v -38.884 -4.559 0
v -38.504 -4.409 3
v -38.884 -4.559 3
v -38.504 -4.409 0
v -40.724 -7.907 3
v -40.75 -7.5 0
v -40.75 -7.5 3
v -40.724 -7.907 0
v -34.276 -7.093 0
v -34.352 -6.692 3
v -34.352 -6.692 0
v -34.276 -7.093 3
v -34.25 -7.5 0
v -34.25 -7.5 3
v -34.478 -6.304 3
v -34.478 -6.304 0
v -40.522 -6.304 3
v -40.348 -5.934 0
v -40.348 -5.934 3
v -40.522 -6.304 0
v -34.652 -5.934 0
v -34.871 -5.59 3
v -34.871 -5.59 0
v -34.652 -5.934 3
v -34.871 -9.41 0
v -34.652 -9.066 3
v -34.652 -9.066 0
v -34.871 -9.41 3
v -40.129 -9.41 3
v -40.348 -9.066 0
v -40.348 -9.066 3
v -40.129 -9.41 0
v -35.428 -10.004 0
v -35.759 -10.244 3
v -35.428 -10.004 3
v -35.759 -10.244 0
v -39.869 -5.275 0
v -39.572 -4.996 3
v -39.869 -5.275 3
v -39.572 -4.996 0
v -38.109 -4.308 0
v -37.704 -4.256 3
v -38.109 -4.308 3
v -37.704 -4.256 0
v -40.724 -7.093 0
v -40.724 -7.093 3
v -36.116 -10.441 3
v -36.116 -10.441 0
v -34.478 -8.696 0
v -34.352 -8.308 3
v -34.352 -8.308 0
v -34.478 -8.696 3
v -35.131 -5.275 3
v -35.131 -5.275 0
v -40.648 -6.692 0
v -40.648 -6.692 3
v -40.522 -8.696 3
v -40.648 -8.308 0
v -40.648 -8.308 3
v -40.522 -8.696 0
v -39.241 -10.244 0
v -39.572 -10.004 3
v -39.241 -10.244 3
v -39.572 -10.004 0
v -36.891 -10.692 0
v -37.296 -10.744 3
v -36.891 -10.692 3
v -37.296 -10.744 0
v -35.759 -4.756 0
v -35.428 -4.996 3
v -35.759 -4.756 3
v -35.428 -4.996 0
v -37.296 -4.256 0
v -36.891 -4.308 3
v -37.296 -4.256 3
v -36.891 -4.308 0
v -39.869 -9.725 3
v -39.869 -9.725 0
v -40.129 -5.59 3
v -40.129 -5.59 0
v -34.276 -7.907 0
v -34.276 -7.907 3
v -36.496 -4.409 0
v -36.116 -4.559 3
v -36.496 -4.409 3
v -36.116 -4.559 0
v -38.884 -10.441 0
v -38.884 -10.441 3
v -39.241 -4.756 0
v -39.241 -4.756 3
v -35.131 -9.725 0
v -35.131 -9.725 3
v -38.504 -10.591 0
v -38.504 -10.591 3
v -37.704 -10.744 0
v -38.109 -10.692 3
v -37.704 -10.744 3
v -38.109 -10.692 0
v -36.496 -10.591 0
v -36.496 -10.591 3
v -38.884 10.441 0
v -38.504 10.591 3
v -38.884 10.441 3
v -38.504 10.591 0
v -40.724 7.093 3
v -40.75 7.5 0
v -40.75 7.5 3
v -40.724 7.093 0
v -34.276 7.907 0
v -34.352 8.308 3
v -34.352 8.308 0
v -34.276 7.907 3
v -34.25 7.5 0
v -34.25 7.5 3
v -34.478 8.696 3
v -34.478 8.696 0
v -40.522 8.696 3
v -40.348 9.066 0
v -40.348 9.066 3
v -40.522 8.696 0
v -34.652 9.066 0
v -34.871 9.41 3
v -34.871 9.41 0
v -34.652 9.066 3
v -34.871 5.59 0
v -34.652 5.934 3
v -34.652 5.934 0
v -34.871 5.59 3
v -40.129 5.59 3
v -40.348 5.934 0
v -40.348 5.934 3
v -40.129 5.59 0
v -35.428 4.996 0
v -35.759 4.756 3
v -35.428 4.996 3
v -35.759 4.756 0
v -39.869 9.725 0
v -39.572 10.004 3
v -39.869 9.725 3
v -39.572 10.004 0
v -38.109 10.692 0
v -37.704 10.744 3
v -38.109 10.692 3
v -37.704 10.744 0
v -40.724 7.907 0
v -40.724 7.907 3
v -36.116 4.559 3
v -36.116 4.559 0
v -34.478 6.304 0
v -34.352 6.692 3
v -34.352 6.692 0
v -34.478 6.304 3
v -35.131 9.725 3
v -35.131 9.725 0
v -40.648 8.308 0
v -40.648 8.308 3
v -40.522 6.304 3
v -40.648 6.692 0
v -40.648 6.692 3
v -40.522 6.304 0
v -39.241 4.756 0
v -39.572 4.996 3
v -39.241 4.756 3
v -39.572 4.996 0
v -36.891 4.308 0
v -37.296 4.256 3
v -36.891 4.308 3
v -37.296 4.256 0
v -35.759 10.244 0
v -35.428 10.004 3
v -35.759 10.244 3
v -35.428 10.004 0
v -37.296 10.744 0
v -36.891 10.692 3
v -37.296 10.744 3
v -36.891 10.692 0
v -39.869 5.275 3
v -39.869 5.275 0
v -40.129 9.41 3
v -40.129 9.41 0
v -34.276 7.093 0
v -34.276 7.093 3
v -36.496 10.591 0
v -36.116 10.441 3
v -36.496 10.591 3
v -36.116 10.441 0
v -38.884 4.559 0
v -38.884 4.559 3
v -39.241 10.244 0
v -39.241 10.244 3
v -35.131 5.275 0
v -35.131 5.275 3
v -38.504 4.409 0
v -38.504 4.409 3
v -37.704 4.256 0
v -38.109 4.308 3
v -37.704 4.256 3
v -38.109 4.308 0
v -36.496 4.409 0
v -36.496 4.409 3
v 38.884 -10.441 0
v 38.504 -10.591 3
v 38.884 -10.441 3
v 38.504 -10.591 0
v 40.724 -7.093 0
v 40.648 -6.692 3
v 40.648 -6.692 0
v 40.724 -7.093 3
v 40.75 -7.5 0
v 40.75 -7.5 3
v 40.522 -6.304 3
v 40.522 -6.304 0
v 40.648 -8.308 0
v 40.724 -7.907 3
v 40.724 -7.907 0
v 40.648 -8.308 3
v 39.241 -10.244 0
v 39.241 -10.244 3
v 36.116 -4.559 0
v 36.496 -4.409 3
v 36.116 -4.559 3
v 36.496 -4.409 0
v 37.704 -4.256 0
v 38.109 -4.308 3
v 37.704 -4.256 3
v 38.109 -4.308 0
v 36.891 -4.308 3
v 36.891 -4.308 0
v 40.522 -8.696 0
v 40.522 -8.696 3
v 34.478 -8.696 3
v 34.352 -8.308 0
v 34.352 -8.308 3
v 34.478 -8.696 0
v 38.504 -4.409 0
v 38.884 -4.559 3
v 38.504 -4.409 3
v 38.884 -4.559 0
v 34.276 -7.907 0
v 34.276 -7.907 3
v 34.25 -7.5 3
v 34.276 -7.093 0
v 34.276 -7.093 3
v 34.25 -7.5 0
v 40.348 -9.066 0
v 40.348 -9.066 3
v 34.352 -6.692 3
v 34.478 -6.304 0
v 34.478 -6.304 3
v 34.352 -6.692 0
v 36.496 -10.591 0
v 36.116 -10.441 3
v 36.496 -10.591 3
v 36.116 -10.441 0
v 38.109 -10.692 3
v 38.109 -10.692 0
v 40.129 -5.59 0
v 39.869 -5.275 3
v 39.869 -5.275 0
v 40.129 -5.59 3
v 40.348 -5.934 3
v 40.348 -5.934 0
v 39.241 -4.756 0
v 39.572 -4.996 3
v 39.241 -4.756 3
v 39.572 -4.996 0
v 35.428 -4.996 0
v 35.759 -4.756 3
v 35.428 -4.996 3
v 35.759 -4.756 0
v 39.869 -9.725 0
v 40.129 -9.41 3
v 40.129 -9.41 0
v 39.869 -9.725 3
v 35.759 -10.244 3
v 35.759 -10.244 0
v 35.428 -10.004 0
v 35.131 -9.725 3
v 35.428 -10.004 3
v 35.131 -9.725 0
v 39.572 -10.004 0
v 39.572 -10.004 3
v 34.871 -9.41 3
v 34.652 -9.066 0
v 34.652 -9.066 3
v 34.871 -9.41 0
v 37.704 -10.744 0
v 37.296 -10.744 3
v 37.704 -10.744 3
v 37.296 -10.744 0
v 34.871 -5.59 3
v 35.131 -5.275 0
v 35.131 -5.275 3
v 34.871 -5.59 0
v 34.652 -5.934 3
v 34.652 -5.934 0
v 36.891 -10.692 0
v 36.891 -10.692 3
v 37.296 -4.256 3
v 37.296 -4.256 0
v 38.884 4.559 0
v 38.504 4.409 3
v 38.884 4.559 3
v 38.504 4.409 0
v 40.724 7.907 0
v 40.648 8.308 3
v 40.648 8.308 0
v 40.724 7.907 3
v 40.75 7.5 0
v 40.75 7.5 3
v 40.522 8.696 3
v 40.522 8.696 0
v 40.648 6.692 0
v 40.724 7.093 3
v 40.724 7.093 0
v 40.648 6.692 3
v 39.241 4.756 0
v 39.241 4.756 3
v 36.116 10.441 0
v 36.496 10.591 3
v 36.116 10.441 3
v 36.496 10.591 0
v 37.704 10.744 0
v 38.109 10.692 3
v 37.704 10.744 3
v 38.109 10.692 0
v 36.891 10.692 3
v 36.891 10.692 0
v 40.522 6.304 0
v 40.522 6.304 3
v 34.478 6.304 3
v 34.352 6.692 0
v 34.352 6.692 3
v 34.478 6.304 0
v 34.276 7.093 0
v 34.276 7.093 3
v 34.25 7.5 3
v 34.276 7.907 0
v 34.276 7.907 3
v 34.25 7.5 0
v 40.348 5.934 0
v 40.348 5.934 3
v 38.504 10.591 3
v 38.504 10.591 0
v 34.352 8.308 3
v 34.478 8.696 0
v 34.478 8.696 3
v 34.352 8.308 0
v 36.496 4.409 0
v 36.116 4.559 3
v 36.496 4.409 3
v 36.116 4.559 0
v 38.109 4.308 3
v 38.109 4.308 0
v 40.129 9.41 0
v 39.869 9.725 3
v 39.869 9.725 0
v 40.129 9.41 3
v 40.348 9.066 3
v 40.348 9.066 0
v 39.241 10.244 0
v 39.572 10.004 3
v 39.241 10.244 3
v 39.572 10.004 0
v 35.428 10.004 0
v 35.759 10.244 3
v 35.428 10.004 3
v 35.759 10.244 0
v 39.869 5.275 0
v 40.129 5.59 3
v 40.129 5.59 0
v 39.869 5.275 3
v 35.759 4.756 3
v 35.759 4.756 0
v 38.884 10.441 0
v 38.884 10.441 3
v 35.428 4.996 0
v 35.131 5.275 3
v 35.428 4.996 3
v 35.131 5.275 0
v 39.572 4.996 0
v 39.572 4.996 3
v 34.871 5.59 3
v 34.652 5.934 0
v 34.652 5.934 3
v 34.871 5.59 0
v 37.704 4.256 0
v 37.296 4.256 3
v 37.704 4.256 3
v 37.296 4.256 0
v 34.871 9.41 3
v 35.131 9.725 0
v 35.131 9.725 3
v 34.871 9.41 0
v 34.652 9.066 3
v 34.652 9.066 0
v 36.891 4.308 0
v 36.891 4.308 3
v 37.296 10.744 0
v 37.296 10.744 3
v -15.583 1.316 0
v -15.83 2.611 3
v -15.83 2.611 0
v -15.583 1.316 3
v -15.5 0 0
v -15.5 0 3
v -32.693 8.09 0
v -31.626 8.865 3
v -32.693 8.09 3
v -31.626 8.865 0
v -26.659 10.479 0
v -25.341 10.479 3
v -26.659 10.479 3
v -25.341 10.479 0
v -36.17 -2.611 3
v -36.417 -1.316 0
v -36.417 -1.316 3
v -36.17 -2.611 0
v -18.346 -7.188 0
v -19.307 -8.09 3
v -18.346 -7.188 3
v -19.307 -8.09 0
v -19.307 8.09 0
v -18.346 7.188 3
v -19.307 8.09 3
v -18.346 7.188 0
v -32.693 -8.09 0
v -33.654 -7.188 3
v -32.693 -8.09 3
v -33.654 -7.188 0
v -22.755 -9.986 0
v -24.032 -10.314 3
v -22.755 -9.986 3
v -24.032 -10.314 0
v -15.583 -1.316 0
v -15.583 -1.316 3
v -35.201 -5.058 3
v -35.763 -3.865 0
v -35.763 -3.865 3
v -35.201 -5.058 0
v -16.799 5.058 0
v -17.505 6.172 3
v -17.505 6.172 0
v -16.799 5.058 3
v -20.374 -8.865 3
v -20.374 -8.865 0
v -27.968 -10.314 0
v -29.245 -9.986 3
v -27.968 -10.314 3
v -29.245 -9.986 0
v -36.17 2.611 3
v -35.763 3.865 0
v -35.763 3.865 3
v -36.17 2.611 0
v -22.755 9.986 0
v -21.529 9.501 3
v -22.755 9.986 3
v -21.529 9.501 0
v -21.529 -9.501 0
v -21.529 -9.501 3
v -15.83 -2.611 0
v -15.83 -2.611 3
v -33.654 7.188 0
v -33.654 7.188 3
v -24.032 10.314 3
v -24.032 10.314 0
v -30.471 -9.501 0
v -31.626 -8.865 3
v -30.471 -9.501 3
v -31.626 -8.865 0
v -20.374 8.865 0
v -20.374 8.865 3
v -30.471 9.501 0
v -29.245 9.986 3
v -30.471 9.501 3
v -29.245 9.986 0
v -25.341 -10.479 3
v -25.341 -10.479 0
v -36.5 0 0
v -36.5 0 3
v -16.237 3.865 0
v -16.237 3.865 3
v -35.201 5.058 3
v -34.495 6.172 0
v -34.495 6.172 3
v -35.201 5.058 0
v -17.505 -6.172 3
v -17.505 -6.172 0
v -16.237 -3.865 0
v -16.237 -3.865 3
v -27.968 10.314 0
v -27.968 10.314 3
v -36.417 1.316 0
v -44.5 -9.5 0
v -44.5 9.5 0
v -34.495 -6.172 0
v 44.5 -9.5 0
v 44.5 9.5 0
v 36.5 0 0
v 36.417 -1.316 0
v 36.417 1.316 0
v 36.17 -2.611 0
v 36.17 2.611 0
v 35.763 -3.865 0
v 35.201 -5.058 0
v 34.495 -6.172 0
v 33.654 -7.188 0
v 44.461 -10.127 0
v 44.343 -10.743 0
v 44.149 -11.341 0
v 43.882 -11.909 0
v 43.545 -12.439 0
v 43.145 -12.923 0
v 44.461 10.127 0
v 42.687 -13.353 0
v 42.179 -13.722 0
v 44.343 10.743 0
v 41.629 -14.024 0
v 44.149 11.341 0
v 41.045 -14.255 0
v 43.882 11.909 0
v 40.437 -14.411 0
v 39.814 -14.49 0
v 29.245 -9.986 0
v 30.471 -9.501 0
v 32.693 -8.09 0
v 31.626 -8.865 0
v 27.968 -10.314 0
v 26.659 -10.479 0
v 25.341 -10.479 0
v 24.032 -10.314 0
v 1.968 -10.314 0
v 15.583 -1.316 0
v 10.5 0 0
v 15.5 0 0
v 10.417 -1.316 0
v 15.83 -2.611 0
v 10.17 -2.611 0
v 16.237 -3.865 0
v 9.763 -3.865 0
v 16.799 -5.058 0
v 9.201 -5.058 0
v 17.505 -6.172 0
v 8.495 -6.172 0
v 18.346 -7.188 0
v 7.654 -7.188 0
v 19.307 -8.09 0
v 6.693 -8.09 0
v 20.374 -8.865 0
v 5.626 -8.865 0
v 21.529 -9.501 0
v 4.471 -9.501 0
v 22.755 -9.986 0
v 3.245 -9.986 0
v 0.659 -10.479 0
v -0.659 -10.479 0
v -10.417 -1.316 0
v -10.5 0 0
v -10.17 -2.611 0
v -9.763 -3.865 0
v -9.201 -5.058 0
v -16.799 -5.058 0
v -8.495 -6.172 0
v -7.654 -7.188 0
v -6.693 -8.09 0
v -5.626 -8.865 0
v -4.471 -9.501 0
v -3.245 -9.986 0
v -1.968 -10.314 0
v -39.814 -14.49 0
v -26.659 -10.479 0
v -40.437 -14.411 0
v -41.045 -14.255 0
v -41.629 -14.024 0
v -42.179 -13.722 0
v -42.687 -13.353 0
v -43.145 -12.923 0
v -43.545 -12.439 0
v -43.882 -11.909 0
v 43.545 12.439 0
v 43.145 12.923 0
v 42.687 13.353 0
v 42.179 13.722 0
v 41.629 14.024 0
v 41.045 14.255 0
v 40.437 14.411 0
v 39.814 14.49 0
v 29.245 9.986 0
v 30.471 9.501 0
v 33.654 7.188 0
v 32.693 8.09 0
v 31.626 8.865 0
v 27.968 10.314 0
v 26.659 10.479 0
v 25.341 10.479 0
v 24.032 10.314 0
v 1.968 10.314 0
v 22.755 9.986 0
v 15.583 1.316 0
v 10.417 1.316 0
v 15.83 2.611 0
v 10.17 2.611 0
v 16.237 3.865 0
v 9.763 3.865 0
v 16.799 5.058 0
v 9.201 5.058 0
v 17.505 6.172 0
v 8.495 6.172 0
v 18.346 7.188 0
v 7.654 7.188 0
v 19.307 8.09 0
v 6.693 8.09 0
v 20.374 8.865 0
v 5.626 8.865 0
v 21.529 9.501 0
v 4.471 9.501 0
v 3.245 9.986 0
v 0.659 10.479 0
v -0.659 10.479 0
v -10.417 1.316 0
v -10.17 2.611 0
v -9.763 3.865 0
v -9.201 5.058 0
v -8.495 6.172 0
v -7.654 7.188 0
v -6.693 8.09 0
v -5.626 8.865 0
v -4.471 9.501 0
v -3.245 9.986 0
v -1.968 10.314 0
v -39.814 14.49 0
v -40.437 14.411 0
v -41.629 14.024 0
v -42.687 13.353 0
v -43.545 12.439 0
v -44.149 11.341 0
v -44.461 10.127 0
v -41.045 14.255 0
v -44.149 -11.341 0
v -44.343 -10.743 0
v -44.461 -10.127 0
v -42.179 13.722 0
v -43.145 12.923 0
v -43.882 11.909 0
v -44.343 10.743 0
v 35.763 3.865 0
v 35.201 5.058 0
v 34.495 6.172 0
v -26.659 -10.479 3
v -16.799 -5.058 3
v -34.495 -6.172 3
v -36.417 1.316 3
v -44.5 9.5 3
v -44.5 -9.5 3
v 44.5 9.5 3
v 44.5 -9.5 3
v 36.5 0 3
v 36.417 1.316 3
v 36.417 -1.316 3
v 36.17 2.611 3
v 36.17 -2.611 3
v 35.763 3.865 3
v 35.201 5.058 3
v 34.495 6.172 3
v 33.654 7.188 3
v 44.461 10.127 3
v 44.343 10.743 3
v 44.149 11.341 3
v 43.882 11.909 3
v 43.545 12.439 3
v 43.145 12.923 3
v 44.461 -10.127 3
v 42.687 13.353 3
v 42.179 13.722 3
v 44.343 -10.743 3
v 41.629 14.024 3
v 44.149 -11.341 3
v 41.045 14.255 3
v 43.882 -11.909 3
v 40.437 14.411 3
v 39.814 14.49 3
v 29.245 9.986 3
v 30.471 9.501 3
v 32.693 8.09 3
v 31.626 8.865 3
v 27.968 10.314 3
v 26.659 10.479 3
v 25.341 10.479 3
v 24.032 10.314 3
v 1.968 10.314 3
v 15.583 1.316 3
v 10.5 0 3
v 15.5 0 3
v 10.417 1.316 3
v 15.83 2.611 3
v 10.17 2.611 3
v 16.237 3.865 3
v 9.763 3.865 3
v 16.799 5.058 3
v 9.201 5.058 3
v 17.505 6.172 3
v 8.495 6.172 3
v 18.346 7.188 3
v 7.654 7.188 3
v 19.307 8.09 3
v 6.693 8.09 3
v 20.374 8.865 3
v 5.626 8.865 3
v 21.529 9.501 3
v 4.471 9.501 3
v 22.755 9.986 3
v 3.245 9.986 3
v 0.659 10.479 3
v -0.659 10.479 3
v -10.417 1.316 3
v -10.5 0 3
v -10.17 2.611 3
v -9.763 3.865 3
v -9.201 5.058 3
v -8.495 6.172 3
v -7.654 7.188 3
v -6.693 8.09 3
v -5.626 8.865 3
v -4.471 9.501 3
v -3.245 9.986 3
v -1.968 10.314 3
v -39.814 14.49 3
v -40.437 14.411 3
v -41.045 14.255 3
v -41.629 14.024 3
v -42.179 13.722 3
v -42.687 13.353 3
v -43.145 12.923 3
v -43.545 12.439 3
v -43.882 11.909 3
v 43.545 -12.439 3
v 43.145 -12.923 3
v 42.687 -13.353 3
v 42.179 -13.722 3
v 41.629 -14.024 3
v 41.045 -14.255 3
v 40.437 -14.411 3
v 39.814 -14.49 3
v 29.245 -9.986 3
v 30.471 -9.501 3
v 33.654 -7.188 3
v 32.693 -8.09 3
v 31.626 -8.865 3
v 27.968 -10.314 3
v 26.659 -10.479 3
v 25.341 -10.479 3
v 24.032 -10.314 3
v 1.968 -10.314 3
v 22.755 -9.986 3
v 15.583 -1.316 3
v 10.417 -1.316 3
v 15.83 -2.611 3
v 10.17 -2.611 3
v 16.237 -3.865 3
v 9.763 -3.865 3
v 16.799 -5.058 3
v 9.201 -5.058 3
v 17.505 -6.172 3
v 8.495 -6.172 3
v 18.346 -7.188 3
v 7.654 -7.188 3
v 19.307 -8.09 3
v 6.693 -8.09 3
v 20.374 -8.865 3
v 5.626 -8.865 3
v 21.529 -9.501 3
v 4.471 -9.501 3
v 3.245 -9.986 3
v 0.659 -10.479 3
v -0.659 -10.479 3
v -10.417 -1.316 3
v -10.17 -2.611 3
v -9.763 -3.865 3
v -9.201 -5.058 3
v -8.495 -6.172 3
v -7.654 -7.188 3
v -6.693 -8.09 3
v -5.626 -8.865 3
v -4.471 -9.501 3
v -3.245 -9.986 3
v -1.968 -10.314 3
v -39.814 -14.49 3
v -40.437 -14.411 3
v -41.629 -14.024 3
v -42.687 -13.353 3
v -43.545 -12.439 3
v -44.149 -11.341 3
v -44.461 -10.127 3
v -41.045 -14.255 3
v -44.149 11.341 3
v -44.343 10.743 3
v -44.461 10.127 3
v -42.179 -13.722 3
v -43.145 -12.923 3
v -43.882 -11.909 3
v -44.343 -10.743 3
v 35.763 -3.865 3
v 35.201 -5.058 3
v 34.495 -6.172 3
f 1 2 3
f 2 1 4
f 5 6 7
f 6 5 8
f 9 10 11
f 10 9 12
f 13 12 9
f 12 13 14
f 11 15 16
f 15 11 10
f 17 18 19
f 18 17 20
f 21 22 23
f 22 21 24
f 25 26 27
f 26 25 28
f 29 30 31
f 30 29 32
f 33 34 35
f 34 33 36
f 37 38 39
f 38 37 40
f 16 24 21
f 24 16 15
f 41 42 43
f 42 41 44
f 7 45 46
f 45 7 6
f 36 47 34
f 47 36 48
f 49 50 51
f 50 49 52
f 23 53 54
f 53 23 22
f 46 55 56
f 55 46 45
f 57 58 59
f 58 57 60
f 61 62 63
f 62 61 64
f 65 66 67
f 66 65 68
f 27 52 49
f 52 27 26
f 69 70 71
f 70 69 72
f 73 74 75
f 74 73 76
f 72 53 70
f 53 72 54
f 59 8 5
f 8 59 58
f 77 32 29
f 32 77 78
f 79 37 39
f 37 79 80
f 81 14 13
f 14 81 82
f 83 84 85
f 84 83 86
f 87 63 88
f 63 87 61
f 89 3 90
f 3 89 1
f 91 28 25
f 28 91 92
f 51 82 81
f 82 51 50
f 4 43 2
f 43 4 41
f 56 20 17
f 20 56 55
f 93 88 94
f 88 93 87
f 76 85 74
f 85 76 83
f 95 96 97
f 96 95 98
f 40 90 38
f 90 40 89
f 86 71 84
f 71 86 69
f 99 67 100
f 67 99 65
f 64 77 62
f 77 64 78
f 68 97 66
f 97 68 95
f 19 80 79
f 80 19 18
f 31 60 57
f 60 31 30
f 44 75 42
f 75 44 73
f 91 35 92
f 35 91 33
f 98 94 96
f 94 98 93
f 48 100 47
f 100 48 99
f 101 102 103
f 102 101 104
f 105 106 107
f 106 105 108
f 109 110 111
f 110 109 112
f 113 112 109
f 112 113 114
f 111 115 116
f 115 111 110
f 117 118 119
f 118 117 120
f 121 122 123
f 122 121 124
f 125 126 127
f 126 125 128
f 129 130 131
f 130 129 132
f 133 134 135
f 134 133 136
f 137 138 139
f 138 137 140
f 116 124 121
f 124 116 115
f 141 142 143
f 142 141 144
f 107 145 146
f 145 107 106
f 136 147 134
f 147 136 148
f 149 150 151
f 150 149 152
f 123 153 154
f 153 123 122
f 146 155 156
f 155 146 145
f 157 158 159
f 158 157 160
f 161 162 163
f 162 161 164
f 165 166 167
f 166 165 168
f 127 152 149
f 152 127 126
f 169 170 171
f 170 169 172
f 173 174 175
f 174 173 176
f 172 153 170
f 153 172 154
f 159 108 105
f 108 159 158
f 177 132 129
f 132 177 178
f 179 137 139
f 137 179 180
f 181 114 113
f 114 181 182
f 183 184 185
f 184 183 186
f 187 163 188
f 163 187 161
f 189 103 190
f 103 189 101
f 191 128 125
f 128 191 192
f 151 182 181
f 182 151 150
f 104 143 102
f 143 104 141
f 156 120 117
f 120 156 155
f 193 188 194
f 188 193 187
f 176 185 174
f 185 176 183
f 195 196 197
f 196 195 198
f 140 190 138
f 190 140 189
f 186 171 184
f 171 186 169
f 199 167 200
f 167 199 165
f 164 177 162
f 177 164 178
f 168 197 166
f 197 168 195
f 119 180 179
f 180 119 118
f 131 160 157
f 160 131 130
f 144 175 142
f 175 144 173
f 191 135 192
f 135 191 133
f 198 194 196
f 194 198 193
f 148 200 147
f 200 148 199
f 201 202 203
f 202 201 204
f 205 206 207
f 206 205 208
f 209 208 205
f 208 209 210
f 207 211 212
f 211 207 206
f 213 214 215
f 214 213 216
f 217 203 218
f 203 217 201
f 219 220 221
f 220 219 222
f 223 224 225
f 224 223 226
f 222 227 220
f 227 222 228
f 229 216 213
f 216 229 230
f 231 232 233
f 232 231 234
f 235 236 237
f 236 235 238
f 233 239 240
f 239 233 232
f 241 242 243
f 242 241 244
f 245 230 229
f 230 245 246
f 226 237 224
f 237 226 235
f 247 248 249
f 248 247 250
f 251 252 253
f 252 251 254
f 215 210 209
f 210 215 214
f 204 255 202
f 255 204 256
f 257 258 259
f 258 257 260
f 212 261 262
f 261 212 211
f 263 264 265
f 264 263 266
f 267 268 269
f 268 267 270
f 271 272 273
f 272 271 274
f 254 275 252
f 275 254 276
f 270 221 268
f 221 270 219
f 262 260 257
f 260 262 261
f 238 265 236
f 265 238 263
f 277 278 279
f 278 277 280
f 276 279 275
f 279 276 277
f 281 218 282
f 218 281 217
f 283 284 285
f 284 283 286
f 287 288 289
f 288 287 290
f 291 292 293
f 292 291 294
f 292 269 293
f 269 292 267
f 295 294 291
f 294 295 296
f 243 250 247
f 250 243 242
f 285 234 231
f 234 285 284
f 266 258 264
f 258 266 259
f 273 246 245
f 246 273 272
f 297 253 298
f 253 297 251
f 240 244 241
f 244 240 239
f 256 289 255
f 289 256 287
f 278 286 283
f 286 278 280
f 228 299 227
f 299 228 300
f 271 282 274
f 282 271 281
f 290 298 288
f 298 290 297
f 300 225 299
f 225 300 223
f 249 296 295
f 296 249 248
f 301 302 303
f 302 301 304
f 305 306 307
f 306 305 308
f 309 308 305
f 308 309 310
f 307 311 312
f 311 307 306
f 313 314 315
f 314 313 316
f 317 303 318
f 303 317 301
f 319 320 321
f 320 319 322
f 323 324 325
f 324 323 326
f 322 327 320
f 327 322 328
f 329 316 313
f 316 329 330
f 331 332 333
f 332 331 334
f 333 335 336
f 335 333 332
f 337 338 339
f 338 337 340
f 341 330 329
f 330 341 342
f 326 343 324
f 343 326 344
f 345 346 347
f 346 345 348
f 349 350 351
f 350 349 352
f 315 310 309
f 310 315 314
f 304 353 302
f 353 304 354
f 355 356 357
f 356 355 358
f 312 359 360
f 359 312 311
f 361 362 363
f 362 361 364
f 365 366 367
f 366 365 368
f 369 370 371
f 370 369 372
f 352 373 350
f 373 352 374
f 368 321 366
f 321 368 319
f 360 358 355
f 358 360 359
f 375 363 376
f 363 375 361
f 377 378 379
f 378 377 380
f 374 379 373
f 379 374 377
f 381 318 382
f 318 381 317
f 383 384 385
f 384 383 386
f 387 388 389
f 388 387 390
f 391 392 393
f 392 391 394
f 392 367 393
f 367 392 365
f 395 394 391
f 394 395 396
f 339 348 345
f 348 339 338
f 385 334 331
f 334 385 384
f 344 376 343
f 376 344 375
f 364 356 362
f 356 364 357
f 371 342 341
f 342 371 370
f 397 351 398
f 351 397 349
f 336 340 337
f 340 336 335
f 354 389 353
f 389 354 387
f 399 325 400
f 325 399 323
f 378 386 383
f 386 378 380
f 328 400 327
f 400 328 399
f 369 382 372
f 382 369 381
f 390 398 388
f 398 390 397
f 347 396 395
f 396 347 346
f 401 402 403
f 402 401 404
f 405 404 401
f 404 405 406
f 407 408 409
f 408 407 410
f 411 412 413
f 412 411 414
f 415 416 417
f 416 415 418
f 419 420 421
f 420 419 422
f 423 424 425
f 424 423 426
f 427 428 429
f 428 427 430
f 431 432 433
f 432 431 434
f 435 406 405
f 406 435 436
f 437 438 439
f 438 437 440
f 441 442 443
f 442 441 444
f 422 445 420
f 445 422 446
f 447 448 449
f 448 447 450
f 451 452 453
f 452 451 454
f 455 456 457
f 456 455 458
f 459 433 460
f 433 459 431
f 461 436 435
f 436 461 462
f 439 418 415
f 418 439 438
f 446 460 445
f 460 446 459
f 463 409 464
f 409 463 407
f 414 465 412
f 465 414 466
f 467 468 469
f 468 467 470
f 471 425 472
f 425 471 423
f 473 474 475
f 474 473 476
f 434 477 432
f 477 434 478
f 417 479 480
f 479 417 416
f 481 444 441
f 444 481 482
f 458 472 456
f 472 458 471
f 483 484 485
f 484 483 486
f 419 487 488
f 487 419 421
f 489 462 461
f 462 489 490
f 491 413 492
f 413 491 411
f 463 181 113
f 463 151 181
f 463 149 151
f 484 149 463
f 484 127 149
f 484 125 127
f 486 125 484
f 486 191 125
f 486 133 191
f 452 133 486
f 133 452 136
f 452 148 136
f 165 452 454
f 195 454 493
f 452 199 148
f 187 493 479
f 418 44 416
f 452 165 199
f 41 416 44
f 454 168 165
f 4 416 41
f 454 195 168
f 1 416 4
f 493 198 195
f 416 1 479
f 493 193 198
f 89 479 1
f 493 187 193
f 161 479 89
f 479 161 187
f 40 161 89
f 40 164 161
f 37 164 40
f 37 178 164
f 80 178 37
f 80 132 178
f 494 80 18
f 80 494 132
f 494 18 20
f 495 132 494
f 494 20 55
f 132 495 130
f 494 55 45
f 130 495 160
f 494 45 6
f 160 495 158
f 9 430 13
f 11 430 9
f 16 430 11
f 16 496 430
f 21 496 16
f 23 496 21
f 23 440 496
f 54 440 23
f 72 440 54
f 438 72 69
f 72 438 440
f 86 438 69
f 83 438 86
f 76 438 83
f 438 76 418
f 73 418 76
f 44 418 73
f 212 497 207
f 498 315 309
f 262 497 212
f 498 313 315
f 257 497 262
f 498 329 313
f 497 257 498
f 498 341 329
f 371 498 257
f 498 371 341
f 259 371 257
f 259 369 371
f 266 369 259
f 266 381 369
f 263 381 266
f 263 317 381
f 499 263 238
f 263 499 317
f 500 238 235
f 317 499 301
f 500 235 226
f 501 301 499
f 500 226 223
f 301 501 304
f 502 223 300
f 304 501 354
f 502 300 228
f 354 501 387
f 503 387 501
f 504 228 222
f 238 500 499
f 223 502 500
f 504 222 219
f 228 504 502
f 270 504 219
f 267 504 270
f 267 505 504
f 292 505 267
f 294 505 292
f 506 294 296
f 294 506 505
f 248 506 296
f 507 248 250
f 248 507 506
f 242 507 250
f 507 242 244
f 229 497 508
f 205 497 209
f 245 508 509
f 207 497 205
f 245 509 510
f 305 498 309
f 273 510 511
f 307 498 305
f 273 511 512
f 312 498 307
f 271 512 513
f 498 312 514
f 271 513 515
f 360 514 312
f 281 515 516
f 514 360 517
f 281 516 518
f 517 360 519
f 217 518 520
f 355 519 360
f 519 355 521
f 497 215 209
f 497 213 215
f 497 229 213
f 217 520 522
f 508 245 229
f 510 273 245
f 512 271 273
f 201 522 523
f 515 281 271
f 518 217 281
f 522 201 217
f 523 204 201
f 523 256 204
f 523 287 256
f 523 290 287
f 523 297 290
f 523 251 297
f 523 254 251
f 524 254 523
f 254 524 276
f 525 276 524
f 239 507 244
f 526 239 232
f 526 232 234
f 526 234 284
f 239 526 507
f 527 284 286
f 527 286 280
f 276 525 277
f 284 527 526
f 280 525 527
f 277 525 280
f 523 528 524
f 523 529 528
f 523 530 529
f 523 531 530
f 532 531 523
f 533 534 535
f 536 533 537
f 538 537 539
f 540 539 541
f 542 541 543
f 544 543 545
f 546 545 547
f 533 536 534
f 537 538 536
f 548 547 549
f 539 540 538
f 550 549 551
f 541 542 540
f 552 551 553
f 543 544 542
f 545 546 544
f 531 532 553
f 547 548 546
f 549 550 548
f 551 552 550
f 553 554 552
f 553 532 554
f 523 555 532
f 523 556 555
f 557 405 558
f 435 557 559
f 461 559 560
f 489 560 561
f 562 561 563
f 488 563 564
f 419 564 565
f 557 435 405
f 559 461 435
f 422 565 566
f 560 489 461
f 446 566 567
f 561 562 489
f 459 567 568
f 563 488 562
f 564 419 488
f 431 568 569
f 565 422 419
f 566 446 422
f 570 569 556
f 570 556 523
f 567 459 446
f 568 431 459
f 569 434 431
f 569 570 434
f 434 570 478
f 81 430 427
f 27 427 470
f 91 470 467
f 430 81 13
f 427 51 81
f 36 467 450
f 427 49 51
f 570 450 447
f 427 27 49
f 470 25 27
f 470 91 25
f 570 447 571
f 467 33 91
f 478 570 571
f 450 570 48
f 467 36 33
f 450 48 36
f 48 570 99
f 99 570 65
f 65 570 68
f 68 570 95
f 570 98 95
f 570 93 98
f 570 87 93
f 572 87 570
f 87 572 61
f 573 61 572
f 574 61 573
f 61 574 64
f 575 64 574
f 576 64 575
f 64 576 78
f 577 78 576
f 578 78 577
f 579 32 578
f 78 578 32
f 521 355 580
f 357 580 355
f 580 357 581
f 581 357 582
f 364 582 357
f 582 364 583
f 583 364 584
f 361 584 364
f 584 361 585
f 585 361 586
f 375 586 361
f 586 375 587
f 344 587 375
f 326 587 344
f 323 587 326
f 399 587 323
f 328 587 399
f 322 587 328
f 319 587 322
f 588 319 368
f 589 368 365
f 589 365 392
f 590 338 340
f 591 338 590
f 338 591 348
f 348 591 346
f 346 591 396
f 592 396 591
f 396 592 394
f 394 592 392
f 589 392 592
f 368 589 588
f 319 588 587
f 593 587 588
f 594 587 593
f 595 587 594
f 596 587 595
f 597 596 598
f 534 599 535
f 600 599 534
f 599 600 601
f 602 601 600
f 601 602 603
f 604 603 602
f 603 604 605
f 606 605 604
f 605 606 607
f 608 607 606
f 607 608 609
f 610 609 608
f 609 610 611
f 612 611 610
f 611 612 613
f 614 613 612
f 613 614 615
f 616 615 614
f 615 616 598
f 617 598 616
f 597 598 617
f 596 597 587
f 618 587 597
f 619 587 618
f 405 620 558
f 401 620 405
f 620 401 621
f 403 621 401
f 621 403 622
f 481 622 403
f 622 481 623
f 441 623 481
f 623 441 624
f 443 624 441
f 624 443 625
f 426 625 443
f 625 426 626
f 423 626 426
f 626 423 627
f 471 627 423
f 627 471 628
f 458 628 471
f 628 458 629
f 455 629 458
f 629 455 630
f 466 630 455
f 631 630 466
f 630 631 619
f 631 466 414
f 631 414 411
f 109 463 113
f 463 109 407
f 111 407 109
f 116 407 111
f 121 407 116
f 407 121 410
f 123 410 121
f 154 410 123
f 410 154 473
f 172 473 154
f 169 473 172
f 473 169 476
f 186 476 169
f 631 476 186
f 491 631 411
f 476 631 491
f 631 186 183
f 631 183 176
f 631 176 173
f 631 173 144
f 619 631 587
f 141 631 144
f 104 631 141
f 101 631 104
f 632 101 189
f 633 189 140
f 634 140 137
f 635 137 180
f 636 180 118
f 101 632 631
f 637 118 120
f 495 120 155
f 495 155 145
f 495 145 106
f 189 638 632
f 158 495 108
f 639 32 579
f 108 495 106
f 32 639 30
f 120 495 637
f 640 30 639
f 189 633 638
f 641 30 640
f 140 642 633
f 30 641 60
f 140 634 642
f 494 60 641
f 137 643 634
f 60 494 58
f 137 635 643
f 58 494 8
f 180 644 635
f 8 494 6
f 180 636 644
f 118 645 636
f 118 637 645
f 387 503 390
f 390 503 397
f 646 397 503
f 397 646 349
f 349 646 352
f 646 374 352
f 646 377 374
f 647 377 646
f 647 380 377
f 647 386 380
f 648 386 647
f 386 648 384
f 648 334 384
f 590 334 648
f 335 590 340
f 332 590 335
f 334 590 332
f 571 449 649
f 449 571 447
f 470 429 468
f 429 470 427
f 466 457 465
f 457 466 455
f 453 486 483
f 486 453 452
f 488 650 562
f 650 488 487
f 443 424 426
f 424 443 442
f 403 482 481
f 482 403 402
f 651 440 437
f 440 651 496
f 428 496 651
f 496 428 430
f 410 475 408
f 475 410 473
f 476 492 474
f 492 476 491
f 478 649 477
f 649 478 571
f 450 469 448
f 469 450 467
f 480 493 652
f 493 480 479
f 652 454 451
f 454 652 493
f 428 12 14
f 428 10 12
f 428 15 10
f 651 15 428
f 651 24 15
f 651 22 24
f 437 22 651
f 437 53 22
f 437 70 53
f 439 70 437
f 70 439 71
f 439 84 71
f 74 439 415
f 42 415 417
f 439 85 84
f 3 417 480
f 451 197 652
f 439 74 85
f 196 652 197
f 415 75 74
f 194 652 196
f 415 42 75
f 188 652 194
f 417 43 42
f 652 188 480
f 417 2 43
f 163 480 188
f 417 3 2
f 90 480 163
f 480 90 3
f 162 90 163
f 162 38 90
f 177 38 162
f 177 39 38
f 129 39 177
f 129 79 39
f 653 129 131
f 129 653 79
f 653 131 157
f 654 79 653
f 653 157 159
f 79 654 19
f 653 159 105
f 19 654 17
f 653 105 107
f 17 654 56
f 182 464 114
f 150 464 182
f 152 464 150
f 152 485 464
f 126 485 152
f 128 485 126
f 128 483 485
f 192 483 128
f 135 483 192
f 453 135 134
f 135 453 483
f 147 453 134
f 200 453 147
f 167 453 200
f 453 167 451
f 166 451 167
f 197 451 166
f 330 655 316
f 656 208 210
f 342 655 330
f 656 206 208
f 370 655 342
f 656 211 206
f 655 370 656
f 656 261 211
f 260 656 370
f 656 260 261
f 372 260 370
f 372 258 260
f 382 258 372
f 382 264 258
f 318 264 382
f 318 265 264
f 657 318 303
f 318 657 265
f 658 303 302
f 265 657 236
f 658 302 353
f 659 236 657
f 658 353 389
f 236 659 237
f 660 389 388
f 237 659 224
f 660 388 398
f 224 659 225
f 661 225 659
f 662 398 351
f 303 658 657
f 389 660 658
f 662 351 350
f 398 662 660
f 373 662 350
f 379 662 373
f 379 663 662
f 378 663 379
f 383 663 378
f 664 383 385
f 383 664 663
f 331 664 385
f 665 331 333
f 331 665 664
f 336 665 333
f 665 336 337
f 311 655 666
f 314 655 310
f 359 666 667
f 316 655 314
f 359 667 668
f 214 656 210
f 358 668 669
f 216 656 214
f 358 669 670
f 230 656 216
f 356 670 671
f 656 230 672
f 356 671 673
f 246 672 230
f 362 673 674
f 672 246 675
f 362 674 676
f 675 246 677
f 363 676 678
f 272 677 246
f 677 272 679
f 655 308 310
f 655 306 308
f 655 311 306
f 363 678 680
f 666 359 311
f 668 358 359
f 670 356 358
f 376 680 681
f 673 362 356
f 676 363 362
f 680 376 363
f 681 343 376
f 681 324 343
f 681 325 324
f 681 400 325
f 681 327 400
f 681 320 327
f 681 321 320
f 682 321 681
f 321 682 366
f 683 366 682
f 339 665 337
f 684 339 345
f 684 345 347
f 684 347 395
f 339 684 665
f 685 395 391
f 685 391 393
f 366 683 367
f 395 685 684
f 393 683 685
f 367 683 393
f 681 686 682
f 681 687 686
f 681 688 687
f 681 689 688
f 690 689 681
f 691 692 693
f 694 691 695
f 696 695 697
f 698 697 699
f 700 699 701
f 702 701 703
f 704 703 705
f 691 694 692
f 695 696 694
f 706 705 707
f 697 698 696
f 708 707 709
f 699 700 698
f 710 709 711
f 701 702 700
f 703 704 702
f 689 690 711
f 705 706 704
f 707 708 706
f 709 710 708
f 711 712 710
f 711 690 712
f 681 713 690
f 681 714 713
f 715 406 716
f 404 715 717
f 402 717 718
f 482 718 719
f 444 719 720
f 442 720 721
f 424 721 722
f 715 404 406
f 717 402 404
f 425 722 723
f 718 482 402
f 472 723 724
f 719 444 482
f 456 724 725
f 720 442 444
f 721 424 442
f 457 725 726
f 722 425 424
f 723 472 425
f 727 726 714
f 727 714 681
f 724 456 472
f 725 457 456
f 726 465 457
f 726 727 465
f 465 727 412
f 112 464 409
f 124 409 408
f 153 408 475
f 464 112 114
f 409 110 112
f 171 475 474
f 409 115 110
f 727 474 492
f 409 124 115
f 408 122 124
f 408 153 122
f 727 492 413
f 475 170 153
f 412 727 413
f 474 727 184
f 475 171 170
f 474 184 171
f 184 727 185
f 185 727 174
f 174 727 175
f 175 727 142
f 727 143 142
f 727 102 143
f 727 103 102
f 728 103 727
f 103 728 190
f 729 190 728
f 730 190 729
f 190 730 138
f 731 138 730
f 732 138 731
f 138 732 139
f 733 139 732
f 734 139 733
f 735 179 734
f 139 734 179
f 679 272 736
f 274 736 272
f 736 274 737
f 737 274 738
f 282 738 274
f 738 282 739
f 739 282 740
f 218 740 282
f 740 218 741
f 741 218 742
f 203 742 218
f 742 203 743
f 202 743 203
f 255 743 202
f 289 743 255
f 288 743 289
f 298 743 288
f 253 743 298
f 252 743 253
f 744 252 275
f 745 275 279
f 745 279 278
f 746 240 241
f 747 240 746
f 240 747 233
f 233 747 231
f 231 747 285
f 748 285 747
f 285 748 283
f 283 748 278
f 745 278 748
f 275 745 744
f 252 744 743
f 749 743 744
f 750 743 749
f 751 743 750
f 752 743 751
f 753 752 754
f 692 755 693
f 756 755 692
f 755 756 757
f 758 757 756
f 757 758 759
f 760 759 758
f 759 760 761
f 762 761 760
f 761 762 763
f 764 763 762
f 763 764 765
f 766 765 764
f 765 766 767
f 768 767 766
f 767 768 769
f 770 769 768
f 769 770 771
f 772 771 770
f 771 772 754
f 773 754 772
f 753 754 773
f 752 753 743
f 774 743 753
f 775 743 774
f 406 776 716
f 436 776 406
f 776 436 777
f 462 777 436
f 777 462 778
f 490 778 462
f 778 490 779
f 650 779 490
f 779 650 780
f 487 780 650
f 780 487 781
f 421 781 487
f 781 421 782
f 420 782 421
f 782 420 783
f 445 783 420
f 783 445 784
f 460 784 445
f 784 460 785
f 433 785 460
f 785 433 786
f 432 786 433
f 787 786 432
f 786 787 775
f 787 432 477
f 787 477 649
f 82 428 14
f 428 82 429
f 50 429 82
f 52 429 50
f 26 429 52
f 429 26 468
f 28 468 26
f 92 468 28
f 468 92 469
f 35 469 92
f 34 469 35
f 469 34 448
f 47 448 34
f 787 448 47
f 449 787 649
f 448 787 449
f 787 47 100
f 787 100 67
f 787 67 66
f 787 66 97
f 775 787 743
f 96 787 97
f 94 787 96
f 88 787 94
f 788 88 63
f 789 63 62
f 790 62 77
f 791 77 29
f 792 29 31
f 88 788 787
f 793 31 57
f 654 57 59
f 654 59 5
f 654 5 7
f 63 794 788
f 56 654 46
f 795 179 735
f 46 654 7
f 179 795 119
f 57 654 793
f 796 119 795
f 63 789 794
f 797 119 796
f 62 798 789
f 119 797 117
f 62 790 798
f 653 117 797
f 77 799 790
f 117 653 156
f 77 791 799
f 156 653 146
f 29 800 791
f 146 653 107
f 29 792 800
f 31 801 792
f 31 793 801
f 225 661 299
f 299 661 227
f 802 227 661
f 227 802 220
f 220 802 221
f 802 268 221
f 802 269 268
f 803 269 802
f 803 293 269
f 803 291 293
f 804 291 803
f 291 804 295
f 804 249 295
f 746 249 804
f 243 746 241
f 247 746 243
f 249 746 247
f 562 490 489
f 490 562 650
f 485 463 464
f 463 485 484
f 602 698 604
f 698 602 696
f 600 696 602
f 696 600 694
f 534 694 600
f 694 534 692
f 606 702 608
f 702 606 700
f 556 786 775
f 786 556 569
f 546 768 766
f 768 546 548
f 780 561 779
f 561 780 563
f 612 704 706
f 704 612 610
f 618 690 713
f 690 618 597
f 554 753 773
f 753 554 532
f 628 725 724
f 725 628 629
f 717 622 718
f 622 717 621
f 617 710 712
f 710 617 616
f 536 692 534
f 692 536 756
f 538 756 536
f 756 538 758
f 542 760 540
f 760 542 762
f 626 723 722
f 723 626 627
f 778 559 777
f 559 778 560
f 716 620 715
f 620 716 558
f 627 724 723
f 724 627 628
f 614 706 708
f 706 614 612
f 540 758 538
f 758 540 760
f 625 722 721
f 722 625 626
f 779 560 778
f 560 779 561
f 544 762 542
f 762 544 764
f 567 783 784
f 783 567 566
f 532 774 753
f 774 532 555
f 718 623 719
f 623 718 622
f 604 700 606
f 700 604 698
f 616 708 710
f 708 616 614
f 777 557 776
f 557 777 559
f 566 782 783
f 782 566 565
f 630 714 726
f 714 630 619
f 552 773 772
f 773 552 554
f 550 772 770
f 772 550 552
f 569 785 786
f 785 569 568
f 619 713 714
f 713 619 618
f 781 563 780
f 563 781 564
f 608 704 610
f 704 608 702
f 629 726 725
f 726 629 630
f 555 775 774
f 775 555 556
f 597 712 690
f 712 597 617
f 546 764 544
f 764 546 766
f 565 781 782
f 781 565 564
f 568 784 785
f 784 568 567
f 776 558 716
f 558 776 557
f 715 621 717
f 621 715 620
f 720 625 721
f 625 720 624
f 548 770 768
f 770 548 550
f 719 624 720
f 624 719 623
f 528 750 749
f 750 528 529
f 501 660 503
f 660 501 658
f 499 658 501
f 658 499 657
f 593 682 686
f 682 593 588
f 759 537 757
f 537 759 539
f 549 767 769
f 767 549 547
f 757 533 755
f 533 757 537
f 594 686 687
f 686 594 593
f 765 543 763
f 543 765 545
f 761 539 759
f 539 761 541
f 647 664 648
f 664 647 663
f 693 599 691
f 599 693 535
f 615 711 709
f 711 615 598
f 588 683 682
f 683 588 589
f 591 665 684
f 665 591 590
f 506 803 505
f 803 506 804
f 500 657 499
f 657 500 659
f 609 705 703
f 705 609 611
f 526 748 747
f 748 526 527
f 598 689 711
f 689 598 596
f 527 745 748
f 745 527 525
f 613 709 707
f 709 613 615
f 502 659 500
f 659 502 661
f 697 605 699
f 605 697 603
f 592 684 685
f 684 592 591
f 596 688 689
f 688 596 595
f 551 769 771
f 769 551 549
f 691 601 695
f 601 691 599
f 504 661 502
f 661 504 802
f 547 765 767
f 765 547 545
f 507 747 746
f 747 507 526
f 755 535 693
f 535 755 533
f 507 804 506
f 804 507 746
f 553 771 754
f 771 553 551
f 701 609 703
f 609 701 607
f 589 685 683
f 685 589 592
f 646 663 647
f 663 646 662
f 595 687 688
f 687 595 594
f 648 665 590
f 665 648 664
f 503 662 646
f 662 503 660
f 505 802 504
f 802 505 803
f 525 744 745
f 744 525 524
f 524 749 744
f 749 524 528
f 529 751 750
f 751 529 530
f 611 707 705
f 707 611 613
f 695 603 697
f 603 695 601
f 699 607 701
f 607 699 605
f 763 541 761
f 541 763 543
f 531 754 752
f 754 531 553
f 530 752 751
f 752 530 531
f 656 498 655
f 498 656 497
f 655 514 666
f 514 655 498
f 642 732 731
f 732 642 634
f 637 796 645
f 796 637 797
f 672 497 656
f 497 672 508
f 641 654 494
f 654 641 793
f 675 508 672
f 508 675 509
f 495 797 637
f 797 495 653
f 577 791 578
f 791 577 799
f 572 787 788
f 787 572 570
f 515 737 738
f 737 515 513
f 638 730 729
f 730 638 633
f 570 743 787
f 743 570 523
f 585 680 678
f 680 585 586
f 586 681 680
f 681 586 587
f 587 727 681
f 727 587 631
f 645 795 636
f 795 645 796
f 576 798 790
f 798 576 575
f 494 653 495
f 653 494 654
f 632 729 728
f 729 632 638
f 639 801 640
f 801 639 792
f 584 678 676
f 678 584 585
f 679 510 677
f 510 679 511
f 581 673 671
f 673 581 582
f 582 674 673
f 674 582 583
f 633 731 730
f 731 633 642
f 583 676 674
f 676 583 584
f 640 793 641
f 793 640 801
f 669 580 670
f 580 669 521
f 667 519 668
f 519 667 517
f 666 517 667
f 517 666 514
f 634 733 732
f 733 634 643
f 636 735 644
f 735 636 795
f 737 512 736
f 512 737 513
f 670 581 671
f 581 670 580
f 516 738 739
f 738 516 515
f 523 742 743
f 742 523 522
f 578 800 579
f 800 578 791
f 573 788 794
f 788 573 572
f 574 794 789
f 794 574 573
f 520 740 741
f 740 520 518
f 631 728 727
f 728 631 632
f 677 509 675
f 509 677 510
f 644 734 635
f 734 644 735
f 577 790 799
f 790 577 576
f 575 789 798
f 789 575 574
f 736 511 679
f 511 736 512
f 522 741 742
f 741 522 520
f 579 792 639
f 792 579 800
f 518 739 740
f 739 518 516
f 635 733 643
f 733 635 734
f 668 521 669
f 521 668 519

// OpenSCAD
$fn = 50;

difference() {
	union() {
		hull() {
			translate(v = [-39.5, 9.5, 0]) {
				cylinder(h = 3, r = 5);
			}
			translate(v = [39.5, 9.5, 0]) {
				cylinder(h = 3, r = 5);
			}
			translate(v = [-39.5, -9.5, 0]) {
				cylinder(h = 3, r = 5);
			}
			translate(v = [39.5, -9.5, 0]) {
				cylinder(h = 3, r = 5);
			}
		}
	}
	union() {
		translate(v = [-37.5, -7.5, -100.0]) {
			cylinder(h = 200, r = 3.25);
		}
		translate(v = [-37.5, 7.5, -100.0]) {
			cylinder(h = 200, r = 3.25);
		}
		translate(v = [37.5, -7.5, -100.0]) {
			cylinder(h = 200, r = 3.25);
		}
		translate(v = [37.5, 7.5, -100.0]) {
			cylinder(h = 200, r = 3.25);
		}
		translate(v = [-37.5, -7.5, -100.0]) {
			cylinder(h = 200, r = 1.8);
		}
		translate(v = [-37.5, 7.5, -100.0]) {
			cylinder(h = 200, r = 1.8);
		}
		translate(v = [37.5, -7.5, -100.0]) {
			cylinder(h = 200, r = 1.8);
		}
		translate(v = [37.5, 7.5, -100.0]) {
			cylinder(h = 200, r = 1.8);
		}
		translate(v = [-26.0, 0, 0.0]) {
			cylinder(h = 3, r = 10.5);
		}
		cylinder(h = 3, r = 10.5);
		translate(v = [26.0, 0, 0.0]) {
			cylinder(h = 3, r = 10.5);
		}
	}
}
